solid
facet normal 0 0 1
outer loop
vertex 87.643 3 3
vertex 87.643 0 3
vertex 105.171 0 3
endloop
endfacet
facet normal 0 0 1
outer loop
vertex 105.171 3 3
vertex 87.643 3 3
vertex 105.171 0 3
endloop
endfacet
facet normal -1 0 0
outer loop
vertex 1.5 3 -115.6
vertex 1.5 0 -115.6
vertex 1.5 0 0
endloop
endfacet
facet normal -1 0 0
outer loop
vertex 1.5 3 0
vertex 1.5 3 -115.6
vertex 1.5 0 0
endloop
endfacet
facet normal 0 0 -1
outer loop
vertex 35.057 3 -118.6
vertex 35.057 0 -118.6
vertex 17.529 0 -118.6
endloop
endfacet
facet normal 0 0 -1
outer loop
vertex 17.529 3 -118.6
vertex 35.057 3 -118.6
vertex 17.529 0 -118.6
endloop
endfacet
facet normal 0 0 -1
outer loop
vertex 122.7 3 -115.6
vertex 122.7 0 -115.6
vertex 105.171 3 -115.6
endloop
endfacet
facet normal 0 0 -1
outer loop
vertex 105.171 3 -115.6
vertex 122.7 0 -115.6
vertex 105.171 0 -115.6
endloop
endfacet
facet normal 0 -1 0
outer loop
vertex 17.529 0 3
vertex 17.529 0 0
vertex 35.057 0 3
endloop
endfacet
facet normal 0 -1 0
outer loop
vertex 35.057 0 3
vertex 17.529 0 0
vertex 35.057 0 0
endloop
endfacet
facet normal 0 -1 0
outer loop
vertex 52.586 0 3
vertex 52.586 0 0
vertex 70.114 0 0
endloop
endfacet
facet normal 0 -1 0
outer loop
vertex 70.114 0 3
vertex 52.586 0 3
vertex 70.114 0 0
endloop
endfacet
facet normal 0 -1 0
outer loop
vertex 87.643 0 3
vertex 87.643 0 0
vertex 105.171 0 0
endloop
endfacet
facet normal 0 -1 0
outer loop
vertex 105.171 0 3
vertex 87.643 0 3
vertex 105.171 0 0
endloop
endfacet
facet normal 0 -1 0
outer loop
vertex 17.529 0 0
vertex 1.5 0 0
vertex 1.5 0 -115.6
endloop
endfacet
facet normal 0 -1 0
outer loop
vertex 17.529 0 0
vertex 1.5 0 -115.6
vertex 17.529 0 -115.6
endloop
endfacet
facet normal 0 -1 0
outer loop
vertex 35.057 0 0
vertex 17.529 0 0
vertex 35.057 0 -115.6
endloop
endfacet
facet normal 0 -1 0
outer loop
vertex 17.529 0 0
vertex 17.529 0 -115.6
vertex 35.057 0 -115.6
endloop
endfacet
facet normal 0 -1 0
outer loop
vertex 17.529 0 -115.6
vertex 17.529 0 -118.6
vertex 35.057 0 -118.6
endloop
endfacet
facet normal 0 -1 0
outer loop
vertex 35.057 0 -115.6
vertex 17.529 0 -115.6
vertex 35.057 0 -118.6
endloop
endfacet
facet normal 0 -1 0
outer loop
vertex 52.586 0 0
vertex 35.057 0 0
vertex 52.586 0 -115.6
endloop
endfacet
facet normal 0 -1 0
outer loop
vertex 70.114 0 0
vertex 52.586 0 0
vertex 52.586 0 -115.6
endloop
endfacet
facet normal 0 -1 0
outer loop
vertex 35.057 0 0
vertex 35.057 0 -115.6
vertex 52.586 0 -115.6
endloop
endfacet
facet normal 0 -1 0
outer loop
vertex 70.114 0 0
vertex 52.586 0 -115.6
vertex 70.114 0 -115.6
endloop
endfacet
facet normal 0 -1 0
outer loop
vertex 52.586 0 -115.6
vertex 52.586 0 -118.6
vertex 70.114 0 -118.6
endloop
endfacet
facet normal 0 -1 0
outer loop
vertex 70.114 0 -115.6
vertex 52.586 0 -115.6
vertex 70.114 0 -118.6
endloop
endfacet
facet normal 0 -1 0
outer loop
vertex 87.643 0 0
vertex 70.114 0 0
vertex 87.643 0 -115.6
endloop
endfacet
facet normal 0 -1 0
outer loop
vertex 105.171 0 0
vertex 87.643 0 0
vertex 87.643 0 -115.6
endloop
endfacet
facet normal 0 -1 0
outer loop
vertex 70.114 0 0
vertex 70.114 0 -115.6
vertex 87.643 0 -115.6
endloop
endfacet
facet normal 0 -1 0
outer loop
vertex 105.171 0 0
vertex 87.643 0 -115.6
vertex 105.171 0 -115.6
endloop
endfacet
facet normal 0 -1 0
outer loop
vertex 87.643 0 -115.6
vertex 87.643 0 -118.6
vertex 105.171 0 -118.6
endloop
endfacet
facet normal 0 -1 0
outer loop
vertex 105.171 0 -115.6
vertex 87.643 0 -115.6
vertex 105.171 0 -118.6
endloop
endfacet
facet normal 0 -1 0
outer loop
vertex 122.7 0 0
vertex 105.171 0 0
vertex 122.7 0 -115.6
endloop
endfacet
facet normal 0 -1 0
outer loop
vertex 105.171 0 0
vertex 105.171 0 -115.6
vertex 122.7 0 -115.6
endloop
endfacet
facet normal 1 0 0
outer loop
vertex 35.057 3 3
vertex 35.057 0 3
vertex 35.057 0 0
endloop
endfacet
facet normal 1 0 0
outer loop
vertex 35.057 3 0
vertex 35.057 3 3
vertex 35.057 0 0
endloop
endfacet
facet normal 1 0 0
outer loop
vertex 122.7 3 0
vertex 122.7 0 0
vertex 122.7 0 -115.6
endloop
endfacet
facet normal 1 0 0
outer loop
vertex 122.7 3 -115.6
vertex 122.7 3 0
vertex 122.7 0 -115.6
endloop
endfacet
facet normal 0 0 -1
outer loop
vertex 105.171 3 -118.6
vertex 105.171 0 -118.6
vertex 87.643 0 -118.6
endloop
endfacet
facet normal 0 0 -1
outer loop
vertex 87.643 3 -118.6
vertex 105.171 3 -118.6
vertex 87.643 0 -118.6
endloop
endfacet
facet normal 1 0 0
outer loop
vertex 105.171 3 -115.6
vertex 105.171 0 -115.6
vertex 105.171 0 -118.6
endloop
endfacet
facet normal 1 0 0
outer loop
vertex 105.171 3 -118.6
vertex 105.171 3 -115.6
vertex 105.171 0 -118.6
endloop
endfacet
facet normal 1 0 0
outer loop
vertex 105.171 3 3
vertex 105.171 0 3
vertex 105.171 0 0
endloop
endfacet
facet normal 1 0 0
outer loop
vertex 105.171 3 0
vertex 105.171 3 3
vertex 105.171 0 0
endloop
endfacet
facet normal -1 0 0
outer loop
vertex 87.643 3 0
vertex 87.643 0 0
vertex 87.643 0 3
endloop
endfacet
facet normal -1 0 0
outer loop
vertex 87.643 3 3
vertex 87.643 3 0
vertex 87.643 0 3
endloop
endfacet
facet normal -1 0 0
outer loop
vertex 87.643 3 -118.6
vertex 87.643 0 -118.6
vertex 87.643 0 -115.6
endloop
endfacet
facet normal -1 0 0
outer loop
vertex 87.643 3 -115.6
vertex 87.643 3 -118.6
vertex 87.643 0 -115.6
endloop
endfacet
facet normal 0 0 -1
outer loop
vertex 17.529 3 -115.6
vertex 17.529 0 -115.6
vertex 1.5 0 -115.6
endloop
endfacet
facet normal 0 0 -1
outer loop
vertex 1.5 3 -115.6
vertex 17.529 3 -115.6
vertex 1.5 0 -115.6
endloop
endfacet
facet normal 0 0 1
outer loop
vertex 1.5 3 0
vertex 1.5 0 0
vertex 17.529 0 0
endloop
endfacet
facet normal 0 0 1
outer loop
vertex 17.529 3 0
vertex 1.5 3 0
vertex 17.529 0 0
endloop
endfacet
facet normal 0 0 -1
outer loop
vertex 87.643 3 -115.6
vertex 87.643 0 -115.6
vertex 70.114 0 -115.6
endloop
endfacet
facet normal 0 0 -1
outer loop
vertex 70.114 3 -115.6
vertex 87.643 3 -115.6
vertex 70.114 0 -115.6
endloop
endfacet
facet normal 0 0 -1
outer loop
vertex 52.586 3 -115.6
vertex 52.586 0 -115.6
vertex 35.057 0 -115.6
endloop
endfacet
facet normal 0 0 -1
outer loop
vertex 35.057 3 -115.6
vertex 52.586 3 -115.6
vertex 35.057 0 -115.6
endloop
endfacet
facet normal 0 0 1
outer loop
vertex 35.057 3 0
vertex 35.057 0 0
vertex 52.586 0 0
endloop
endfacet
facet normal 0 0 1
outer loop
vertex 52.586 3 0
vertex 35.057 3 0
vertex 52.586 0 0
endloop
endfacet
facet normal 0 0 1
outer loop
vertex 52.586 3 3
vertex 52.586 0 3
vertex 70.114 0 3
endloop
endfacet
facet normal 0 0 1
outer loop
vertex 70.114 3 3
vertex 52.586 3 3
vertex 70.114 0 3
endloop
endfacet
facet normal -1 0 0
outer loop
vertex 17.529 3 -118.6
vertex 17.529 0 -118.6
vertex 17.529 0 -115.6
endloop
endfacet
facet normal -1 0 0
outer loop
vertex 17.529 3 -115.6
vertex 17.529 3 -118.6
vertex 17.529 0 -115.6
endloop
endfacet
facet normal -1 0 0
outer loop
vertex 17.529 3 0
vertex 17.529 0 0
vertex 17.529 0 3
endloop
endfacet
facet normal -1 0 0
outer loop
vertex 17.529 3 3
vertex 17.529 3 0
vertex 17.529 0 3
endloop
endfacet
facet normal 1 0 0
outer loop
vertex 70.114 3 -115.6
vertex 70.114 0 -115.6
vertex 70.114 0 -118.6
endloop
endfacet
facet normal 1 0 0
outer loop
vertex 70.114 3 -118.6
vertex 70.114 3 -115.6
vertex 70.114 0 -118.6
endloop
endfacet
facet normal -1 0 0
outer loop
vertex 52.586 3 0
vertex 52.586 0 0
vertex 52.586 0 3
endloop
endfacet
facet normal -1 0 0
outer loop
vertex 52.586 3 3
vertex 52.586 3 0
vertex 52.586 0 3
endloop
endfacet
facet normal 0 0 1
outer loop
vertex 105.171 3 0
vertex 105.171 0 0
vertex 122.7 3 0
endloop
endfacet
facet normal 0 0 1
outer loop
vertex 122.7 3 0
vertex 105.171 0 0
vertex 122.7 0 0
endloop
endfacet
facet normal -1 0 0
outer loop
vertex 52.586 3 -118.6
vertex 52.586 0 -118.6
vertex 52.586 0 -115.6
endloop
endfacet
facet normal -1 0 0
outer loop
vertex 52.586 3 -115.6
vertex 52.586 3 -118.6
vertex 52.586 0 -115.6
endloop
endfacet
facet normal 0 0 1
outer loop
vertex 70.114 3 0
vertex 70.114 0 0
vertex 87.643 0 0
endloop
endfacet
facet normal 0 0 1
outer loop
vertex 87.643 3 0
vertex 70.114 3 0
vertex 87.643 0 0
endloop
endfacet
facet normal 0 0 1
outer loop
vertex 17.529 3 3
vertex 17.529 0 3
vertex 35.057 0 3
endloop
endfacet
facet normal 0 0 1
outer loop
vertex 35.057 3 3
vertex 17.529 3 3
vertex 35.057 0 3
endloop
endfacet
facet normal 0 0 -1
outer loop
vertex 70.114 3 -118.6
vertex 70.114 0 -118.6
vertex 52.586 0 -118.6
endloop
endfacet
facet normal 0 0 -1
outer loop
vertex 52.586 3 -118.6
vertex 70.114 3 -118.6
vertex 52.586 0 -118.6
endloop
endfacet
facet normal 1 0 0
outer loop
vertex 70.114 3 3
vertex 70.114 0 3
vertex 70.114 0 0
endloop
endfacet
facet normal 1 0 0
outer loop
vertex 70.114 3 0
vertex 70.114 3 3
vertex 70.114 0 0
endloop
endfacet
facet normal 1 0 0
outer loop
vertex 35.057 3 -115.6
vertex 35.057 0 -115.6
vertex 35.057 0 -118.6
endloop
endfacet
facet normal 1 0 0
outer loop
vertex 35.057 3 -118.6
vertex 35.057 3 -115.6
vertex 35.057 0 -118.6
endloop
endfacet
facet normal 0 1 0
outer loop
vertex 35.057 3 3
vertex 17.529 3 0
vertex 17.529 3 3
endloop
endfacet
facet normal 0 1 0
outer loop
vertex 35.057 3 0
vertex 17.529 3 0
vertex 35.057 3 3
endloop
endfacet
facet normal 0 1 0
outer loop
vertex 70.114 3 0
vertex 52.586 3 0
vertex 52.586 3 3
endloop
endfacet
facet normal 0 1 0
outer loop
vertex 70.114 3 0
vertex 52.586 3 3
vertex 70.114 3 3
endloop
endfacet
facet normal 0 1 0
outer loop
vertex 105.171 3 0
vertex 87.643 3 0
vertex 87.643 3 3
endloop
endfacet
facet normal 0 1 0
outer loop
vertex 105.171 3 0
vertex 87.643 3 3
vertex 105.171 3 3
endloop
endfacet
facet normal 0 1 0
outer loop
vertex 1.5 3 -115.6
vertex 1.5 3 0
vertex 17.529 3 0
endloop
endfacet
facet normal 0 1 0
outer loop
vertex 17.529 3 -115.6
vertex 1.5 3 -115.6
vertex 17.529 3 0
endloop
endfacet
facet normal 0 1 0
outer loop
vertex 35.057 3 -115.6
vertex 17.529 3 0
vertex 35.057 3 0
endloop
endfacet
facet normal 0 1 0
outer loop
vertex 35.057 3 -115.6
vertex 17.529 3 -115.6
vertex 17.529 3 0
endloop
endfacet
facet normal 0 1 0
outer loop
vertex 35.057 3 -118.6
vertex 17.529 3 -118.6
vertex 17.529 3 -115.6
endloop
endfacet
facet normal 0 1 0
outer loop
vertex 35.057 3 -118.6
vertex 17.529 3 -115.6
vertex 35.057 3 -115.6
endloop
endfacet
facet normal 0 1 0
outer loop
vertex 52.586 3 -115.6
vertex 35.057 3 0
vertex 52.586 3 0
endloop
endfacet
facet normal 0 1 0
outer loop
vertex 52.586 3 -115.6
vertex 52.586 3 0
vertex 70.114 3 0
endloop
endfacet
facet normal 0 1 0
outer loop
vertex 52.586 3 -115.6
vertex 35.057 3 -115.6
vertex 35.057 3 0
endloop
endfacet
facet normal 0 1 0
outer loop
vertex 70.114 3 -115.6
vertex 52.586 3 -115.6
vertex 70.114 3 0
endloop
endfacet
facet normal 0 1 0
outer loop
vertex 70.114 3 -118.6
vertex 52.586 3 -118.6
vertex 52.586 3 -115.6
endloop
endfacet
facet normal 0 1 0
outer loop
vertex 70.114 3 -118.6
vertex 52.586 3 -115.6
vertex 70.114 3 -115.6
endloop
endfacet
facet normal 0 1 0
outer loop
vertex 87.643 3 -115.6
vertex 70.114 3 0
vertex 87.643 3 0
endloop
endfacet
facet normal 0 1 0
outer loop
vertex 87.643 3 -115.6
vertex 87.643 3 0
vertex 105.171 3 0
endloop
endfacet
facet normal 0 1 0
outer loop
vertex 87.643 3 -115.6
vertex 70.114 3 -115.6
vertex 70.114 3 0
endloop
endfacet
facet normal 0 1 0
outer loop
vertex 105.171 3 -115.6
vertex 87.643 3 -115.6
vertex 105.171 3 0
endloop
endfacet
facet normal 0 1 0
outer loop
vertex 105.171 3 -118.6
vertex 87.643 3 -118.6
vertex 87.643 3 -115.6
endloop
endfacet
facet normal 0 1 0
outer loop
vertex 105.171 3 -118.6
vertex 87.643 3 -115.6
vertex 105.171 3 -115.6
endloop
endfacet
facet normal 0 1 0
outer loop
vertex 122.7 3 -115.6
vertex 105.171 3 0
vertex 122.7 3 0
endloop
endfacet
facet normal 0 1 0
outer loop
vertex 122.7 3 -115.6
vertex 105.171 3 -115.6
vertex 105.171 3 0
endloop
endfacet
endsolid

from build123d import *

# Parameters (mm, degrees)
BOSS_EXTRUDE1_DEPTH = 3
SKETCH2_W           = 1.5
SKETCH2_H           = 115.6
CUT_EXTRUDE1_DEPTH  = 4


with BuildPart() as part:
    # Sketch1 → Boss-Extrude1 (new body)
    with BuildSketch(Plane(origin=(0, 0, 0), x_dir=(1, 0, 0), z_dir=(0, 1, 0))):
        Polygon((0, 0), (17.52857143, 0), (17.52857143, -3), (35.05714243, -3), (35.05714243, 0), (52.58571343, 0), (52.58571343, -3), (70.11428443, -3), (70.11428443, 0), (87.64285543, 0), (87.64285543, -3), (105.17142643, -3), (105.17142643, 0), (122.7, 0), (122.7, 115.6), (105.17142643, 115.6), (105.17142643, 118.6), (87.64285543, 118.6), (87.64285543, 115.6), (70.11428443, 115.6), (70.11428443, 118.6), (52.58571343, 118.6), (52.58571343, 115.6), (35.05714243, 115.6), (35.05714243, 118.6), (17.52857143, 118.6), (17.52857143, 115.6), (0, 115.6), align=None)
    extrude(amount=BOSS_EXTRUDE1_DEPTH)

    # Sketch2 → Cut-Extrude1 (cut, through all)
    with BuildSketch(Plane.XZ):
        with Locations((0.75, -57.8)):
            Rectangle(SKETCH2_W, SKETCH2_H)
    extrude(amount=-CUT_EXTRUDE1_DEPTH, mode=Mode.SUBTRACT)


solid = part.part
